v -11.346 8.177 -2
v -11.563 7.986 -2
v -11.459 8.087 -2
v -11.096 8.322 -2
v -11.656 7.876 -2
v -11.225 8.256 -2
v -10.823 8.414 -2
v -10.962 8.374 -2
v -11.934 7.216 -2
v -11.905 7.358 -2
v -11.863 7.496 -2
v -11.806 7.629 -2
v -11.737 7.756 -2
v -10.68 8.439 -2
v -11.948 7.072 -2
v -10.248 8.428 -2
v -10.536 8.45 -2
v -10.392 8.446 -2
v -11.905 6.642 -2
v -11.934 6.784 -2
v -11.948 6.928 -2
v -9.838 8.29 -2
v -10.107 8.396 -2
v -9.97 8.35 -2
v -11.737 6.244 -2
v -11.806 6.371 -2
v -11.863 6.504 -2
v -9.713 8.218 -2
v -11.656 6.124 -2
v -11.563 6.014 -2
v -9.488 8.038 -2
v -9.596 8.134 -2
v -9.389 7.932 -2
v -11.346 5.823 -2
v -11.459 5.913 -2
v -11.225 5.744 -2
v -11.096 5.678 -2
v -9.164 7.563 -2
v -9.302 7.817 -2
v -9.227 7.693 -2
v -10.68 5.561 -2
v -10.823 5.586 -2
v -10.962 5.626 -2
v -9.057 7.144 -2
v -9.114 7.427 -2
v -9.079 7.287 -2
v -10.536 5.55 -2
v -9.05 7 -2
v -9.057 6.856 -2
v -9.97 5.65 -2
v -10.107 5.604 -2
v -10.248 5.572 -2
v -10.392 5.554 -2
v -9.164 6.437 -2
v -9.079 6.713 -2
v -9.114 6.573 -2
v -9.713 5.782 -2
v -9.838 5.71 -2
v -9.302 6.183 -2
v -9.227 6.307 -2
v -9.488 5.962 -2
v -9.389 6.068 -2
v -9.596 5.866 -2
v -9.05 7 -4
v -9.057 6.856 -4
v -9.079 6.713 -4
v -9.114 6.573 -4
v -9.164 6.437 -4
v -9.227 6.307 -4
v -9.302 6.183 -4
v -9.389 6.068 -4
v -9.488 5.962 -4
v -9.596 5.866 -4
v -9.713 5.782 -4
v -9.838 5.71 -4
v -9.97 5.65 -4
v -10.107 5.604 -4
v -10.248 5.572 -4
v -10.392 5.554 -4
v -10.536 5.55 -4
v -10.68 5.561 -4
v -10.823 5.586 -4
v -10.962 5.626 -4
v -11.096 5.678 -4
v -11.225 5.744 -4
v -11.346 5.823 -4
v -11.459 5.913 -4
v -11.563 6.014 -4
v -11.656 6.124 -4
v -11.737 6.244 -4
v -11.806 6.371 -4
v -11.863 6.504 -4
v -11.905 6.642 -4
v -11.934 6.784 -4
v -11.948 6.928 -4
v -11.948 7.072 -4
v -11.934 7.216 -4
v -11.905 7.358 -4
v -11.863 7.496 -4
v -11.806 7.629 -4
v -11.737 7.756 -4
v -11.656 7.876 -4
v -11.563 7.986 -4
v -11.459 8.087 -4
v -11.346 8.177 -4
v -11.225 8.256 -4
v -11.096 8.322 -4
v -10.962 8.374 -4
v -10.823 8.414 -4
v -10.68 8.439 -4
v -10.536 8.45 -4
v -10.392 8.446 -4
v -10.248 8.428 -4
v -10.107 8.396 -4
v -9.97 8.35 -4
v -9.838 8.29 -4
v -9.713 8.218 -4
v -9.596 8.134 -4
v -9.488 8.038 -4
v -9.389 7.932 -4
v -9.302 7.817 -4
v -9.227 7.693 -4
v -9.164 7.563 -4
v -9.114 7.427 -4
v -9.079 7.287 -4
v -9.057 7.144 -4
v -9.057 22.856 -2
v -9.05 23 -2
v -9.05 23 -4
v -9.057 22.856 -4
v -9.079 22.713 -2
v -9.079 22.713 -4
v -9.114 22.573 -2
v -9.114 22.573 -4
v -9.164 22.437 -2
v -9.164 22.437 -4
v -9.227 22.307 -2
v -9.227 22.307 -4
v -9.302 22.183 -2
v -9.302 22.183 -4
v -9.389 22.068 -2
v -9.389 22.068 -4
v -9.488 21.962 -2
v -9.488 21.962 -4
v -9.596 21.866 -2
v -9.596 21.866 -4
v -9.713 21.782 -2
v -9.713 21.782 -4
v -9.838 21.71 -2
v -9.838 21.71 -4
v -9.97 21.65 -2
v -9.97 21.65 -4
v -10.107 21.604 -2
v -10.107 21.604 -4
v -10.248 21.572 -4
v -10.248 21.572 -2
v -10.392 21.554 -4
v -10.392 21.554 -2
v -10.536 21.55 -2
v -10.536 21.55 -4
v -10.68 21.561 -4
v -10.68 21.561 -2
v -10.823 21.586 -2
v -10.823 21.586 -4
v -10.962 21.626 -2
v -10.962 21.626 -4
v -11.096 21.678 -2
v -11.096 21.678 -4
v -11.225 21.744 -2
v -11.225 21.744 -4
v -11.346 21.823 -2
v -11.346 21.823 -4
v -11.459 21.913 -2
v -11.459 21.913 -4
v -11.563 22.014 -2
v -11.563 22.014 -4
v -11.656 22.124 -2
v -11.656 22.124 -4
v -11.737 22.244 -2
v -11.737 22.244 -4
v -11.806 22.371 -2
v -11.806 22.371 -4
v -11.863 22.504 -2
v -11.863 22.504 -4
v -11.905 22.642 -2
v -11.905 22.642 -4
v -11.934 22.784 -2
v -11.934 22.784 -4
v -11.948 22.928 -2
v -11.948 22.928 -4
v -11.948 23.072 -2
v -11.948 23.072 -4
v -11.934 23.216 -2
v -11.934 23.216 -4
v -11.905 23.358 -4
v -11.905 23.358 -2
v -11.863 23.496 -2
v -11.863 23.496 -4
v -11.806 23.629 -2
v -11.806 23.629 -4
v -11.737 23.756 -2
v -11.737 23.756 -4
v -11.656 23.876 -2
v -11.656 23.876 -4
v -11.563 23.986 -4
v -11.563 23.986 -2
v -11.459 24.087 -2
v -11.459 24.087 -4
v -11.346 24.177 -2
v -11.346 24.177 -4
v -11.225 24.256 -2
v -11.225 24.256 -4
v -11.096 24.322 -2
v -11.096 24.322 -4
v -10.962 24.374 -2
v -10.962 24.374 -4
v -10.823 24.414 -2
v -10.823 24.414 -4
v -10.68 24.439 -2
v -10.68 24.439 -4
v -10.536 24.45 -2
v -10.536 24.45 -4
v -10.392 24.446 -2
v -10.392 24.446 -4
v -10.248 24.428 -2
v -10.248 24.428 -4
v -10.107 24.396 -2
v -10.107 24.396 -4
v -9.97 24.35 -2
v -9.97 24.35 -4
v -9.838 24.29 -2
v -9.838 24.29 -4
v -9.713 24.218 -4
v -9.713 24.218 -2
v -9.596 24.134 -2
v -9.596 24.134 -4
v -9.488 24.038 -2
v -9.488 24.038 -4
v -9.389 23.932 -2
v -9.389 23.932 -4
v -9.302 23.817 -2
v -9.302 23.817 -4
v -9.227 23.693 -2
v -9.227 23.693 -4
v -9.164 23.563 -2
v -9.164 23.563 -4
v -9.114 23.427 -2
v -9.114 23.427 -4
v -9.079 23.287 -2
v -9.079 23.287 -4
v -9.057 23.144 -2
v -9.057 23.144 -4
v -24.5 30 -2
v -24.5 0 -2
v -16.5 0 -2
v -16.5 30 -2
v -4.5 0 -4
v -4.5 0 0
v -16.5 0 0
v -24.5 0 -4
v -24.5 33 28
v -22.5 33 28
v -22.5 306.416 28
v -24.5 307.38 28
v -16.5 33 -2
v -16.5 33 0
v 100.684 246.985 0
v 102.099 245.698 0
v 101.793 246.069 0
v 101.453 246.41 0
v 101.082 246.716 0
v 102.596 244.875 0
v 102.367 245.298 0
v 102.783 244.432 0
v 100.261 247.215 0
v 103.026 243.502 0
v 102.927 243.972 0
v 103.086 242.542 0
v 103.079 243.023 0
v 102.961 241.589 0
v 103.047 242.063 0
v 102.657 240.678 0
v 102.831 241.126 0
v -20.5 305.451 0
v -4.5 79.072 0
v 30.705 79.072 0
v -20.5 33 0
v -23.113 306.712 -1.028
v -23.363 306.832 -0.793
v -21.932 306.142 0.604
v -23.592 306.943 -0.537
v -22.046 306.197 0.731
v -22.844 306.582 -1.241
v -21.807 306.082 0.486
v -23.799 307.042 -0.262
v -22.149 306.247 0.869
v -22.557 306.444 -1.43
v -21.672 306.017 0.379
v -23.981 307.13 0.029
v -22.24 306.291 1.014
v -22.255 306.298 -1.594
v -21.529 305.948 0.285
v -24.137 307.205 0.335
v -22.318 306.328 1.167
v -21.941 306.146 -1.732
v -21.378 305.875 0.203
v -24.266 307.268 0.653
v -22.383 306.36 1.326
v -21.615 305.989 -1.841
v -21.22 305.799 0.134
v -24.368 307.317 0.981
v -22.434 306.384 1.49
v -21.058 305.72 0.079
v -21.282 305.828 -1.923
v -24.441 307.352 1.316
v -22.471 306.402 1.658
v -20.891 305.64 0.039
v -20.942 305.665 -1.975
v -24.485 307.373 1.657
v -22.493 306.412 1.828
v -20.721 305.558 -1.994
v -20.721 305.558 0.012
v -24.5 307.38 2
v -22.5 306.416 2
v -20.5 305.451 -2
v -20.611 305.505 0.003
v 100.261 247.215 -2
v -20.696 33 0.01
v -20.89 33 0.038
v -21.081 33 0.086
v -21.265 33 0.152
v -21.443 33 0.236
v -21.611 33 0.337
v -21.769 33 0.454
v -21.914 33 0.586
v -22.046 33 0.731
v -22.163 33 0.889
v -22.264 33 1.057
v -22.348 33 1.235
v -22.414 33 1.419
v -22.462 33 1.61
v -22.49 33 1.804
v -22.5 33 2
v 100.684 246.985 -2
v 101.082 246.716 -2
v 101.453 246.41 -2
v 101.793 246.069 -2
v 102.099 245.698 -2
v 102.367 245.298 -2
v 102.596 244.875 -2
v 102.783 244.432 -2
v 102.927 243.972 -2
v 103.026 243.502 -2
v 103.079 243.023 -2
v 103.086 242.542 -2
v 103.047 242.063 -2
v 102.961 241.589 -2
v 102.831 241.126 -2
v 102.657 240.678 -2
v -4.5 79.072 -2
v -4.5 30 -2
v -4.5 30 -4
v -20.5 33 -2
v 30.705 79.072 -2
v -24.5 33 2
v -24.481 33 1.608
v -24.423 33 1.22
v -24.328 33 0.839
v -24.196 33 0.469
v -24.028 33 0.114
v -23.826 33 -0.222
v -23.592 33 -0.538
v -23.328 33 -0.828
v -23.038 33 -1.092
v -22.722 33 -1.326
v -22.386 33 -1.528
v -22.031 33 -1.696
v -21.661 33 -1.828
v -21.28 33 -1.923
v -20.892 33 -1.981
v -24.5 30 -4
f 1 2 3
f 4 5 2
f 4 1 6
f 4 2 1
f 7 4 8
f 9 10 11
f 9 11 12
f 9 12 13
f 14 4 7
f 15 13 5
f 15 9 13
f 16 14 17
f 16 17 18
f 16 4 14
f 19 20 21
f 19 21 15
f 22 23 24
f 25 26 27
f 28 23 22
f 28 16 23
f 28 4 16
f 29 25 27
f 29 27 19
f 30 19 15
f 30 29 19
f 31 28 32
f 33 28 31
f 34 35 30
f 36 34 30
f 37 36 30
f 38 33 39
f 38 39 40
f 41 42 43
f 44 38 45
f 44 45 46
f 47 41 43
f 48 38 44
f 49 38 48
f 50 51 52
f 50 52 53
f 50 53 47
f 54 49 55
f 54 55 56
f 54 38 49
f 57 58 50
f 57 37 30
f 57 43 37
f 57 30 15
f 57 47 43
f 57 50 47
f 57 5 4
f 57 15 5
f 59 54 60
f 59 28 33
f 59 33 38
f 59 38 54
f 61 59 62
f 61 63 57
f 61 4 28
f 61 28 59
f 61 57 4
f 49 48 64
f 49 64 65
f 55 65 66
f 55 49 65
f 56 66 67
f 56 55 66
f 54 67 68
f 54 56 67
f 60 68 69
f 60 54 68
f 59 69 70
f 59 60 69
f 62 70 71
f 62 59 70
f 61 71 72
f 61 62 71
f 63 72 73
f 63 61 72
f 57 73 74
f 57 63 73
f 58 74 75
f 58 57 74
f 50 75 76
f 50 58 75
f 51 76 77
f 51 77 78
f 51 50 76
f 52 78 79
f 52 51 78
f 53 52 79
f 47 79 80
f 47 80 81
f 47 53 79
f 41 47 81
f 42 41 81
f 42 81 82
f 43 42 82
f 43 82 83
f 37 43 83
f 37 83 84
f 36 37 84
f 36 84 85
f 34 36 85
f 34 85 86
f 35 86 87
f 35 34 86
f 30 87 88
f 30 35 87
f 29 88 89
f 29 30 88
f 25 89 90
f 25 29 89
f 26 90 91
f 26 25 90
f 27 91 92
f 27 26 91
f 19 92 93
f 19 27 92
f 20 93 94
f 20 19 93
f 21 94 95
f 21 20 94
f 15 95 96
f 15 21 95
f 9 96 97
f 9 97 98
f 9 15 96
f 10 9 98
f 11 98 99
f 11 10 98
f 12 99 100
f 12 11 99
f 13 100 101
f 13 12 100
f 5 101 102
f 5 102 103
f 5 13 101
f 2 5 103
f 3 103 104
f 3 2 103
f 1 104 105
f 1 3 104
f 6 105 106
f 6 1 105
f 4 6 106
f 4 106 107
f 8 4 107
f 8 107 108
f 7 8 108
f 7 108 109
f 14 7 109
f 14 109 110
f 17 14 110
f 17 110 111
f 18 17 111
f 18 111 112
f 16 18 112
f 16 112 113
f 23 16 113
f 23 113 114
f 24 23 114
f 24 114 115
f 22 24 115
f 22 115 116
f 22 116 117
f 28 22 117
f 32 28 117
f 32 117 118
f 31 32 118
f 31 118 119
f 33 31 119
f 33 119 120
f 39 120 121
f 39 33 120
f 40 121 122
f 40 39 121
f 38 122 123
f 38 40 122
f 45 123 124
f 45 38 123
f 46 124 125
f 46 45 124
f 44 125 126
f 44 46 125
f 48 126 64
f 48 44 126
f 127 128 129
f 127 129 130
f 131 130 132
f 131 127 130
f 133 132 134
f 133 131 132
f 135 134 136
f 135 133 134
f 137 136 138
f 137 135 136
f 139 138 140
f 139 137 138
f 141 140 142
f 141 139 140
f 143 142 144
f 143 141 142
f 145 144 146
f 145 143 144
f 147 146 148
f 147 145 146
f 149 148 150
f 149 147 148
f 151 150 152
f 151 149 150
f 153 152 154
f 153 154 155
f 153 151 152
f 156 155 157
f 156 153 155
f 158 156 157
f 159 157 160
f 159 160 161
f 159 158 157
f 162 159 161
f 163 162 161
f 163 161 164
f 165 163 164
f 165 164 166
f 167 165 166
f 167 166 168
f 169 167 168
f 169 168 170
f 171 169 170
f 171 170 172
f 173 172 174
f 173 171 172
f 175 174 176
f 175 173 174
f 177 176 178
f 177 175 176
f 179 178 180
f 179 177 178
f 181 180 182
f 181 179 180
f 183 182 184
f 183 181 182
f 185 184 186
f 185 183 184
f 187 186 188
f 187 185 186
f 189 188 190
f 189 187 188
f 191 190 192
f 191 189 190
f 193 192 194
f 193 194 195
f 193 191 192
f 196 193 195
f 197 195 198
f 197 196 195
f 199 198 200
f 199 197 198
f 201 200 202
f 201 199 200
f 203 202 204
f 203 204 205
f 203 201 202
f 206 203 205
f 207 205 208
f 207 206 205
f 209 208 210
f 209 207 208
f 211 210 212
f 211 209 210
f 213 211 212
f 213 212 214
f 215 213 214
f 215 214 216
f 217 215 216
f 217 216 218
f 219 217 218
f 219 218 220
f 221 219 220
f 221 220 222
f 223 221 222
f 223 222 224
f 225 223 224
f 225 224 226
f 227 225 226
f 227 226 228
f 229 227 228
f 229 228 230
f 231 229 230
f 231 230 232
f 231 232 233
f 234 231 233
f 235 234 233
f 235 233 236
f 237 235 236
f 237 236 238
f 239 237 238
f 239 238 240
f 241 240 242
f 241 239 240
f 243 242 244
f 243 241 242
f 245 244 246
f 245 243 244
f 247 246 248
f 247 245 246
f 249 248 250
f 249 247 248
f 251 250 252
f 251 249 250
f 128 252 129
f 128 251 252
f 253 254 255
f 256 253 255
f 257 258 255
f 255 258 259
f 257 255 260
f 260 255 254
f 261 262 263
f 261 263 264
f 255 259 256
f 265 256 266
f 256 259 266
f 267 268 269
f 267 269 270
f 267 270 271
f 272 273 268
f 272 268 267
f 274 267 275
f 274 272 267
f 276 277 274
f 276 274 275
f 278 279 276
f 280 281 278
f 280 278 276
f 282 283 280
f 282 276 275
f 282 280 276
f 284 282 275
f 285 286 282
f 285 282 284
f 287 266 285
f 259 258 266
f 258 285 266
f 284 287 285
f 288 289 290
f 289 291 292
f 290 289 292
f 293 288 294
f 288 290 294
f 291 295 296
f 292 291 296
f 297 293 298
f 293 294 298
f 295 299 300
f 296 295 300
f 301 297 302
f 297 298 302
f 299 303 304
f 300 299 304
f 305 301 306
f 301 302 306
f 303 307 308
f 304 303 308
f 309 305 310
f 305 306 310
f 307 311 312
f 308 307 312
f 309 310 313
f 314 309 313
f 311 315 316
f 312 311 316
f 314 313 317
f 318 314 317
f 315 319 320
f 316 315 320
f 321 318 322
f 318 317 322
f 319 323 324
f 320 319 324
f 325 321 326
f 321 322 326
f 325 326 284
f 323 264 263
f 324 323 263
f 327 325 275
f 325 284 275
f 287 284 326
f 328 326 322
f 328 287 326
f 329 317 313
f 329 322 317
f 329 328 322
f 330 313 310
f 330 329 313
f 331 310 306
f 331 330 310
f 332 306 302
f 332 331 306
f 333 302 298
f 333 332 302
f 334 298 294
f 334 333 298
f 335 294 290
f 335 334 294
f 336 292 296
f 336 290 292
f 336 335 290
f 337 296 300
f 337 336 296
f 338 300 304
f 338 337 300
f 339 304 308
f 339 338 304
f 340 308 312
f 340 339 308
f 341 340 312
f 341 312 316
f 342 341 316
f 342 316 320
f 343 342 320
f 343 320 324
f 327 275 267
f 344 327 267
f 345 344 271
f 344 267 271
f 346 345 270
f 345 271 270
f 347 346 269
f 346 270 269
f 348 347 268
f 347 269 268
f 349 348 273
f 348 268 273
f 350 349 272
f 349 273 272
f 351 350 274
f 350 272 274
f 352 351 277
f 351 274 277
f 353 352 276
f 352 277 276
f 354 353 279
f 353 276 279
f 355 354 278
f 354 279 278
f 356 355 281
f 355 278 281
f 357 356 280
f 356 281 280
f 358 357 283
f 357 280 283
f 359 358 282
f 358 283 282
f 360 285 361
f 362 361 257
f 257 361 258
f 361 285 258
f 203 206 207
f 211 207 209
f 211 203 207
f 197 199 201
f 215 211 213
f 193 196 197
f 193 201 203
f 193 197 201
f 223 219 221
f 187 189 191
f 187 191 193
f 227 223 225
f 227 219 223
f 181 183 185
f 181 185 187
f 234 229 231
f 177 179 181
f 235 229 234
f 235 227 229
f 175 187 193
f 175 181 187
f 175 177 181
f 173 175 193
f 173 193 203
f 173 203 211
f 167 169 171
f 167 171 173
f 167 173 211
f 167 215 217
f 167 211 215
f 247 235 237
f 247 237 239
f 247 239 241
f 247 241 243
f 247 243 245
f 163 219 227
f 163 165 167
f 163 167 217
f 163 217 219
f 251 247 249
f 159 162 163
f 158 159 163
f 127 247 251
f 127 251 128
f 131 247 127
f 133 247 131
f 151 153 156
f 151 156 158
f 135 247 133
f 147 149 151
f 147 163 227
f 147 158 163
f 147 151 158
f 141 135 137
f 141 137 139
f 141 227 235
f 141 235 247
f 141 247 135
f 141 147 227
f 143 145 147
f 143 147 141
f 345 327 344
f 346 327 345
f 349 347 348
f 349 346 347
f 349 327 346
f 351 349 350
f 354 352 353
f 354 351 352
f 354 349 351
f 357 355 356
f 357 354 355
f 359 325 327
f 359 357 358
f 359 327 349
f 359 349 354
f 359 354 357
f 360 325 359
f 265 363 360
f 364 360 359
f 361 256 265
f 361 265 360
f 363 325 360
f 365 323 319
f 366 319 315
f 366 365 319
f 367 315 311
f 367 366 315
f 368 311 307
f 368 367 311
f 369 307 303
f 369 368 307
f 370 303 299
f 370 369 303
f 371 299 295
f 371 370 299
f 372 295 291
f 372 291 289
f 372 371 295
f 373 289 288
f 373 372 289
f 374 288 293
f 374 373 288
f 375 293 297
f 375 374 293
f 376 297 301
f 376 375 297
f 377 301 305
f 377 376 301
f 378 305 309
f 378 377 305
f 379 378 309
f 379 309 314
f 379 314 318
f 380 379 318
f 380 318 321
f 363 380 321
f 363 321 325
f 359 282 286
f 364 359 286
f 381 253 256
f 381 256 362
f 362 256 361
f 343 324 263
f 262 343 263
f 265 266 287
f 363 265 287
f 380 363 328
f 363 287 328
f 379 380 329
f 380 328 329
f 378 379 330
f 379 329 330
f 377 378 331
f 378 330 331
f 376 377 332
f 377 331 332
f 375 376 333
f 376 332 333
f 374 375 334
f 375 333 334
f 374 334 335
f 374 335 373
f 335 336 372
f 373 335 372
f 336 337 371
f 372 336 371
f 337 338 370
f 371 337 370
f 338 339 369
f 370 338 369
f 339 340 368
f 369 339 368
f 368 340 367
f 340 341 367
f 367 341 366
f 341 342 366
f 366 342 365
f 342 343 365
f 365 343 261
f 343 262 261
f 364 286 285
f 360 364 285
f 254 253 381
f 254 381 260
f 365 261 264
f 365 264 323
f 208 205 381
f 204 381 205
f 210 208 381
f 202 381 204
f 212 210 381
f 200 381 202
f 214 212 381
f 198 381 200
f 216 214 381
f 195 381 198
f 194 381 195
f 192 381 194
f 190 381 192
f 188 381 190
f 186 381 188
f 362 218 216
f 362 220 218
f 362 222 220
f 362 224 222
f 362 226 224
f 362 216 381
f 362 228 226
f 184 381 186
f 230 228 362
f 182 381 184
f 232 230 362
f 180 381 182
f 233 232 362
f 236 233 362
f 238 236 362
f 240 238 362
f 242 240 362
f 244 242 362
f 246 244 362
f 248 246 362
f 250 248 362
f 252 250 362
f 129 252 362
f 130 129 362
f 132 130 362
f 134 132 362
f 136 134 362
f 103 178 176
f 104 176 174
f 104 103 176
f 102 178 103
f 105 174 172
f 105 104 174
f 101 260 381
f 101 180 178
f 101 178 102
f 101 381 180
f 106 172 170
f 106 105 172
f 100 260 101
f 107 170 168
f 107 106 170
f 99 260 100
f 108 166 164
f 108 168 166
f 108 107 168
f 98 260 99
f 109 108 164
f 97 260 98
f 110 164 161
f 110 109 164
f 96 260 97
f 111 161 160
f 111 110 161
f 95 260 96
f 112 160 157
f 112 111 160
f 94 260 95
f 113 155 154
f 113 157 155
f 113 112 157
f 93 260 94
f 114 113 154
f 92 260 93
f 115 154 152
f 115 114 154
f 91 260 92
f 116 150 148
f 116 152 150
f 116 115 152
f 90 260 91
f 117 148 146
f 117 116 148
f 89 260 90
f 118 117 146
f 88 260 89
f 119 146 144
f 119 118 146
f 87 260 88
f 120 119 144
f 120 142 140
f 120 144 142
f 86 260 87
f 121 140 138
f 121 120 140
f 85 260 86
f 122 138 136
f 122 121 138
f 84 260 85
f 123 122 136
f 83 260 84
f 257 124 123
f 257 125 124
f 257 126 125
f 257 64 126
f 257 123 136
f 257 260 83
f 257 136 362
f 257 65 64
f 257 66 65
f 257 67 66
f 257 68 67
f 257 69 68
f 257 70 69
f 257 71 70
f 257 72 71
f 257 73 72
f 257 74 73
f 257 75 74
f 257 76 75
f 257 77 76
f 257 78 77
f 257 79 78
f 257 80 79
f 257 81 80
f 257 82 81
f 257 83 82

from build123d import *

# Parameters (mm, degrees)
F1_DEPTH = 400
F2_W     = 221.745663
F2_H     = 423.016819
F3_DEPTH = 50
F4_R     = 1.45
F5_DEPTH = 25
F6_W     = 8
F6_H     = 30
F6_W_2   = 12
F6_R     = 1.45
F7_DEPTH = 2


with BuildPart() as f1:
    # F0 (on Front) → F1 (new body)
    with BuildSketch(Plane.XZ):
        with BuildLine():
            Line((-22.5, 2), (-22.5, 28))
            Line((-22.5, 28), (-24.5, 28))
            Line((-24.5, 28), (-24.5, 2))
            ThreePointArc((-24.5, 2), (-23.328427, -0.828427), (-20.5, -2))
            Line((-20.5, -2), (125.5, -2))
            Line((125.5, -2), (125.5, 0))
            Line((125.5, 0), (-20.5, 0))
            ThreePointArc((-20.5, 0), (-21.914214, 0.585786), (-22.5, 2))
        make_face()
    extrude(amount=-F1_DEPTH)

    # F2 (on Top) → F3 (cut, symmetric)
    with BuildSketch(Plane.XY):
        with Locations((54.499505, 198.406644)):
            Rectangle(F2_W, F2_H)
        with BuildLine():
            Line((-24.5, 33), (-24.5, 307.38047))
            Line((-24.5, 307.38047), (100.260685, 247.214851))
            ThreePointArc((100.260685, 247.214851), (102.783459, 244.43172), (102.656531, 240.67751))
            Line((102.656531, 240.67751), (30.705116, 79.071984))
            Line((30.705116, 79.071984), (-4.5, 79.071984))
            Line((-4.5, 79.071984), (-4.5, 0))
            Line((-4.5, 0), (-16.5, 0))
            Line((-16.5, 0), (-16.5, 33))
            Line((-16.5, 33), (-24.5, 33))
        make_face(mode=Mode.SUBTRACT)
    extrude(amount=F3_DEPTH, both=True, mode=Mode.SUBTRACT)

    # F4 (on face) → F5 (cut)
    with BuildSketch(Plane(origin=(0, 0, -2), x_dir=(1, 0, 0), z_dir=(0, 0, -1))):
        with Locations((-18.5, -7)):
            Circle(F4_R)
        with Locations((-18.5, -23)):
            Circle(F4_R)
    extrude(amount=-F5_DEPTH, mode=Mode.SUBTRACT)

    # F6 (on face) → F7 (join)
    with BuildSketch(Plane(origin=(0, 0, -2), x_dir=(1, 0, 0), z_dir=(0, 0, -1))):
        with Locations((-20.5, -15)):
            Rectangle(F6_W, F6_H)
        with Locations((-10.5, -15)):
            Rectangle(F6_W_2, F6_H)
        with Locations((-10.5, -23)):
            Circle(F6_R, mode=Mode.SUBTRACT)
        with Locations((-10.5, -7)):
            Circle(F6_R, mode=Mode.SUBTRACT)
    extrude(amount=F7_DEPTH)


solid = f1.part
